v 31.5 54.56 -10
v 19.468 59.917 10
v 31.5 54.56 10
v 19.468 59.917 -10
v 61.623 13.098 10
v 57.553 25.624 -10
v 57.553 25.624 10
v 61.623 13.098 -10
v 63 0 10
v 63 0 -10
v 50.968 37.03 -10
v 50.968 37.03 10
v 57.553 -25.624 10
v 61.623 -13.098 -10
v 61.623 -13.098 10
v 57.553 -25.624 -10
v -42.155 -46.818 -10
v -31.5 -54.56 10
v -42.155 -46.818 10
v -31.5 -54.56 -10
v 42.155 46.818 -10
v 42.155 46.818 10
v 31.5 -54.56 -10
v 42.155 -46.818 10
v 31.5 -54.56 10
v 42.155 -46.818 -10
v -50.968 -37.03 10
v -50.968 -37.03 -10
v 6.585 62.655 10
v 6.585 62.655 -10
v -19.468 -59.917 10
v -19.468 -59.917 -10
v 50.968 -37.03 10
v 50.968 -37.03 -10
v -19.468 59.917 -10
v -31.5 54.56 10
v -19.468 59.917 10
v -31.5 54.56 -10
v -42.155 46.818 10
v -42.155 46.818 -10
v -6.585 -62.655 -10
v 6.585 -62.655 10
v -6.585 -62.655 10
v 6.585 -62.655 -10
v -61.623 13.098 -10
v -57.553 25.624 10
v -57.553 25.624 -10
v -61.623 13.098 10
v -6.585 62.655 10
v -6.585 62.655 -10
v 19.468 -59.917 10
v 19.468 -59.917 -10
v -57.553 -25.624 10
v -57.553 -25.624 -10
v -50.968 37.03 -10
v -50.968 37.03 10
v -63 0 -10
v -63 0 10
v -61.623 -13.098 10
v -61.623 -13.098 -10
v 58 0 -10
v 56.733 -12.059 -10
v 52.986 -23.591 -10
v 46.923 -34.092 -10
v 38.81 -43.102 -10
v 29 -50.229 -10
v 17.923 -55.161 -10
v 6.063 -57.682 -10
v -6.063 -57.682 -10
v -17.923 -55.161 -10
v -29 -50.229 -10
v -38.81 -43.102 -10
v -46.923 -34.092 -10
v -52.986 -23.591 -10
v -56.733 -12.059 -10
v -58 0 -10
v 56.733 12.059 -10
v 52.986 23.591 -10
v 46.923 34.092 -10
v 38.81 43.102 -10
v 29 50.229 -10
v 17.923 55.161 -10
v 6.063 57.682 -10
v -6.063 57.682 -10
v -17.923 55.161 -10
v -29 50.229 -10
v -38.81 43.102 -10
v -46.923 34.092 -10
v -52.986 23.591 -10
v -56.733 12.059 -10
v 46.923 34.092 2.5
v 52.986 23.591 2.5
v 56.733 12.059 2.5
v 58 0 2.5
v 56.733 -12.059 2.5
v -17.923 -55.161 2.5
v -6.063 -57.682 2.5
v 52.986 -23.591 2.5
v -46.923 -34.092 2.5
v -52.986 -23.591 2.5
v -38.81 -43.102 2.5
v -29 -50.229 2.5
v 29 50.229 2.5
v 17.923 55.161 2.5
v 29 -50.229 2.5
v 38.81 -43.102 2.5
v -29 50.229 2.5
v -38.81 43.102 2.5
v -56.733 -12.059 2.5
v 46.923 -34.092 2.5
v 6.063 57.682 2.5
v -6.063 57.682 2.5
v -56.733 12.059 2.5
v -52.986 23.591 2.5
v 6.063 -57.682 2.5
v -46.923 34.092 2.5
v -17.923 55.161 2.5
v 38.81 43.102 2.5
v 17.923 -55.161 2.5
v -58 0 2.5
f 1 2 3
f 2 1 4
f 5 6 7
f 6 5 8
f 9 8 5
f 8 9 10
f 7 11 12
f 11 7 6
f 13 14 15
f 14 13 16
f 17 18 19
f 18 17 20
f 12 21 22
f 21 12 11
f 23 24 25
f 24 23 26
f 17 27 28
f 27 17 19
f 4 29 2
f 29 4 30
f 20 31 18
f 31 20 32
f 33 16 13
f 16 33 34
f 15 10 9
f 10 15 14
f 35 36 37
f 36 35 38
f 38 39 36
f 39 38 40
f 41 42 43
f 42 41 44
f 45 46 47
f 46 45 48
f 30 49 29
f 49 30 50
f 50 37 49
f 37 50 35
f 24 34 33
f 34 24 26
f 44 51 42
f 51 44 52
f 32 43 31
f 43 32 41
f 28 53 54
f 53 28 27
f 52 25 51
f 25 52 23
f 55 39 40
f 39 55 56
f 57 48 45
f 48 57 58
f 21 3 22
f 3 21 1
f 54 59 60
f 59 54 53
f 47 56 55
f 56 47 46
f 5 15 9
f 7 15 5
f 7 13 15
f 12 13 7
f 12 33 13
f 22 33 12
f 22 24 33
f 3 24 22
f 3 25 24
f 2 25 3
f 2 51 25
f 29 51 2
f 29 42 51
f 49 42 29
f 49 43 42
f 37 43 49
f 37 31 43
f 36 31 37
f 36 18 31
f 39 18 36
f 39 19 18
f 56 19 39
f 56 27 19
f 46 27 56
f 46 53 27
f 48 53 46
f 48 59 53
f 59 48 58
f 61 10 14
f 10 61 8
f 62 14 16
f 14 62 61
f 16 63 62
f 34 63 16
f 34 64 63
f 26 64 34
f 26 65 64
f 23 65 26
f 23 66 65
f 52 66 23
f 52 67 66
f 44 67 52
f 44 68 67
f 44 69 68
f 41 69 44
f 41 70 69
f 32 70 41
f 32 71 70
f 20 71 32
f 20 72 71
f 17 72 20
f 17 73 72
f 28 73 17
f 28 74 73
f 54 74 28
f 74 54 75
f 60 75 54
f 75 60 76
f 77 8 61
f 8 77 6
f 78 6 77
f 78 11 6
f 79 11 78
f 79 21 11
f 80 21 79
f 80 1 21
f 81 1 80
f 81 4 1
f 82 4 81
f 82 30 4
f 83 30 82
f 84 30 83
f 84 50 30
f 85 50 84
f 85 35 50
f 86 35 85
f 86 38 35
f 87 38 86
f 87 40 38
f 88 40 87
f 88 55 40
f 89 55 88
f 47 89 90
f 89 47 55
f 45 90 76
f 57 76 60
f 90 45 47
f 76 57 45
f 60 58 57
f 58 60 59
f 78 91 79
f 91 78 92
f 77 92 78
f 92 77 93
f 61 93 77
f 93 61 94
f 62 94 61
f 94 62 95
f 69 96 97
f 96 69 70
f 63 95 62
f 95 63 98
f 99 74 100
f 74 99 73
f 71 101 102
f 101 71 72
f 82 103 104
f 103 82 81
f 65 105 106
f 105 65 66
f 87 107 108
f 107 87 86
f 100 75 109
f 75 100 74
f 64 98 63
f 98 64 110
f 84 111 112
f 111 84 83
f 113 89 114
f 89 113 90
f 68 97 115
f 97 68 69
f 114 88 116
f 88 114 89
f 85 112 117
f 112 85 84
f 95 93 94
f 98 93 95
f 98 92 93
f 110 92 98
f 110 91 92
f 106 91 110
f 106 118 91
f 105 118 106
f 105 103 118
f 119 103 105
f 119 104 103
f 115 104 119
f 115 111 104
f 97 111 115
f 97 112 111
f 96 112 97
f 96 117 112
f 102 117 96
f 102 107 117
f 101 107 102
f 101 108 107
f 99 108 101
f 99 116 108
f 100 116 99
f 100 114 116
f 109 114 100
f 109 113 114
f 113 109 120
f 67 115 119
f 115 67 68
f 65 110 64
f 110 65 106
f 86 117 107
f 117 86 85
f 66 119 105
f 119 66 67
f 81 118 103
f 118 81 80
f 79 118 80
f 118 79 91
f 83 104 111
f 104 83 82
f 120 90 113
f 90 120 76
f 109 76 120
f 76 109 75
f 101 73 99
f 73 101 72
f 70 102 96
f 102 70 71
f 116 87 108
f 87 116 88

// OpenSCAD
HOLE_DIAMETER = 116;
WALL_HEIGHT = 10;
TRAY_BOTTOM_HEIGHT = 5;

module open_sphere(height, inner_radius, wall_size) {
    difference() {
        cylinder(h=height+wall_size, r=inner_radius+wall_size, center=true);
        translate([0, 0, - wall_size]) {
            cylinder(h = height, r=inner_radius, center=true);
        }
    }
}

open_sphere(WALL_HEIGHT + TRAY_BOTTOM_HEIGHT, HOLE_DIAMETER / 2, TRAY_BOTTOM_HEIGHT);
